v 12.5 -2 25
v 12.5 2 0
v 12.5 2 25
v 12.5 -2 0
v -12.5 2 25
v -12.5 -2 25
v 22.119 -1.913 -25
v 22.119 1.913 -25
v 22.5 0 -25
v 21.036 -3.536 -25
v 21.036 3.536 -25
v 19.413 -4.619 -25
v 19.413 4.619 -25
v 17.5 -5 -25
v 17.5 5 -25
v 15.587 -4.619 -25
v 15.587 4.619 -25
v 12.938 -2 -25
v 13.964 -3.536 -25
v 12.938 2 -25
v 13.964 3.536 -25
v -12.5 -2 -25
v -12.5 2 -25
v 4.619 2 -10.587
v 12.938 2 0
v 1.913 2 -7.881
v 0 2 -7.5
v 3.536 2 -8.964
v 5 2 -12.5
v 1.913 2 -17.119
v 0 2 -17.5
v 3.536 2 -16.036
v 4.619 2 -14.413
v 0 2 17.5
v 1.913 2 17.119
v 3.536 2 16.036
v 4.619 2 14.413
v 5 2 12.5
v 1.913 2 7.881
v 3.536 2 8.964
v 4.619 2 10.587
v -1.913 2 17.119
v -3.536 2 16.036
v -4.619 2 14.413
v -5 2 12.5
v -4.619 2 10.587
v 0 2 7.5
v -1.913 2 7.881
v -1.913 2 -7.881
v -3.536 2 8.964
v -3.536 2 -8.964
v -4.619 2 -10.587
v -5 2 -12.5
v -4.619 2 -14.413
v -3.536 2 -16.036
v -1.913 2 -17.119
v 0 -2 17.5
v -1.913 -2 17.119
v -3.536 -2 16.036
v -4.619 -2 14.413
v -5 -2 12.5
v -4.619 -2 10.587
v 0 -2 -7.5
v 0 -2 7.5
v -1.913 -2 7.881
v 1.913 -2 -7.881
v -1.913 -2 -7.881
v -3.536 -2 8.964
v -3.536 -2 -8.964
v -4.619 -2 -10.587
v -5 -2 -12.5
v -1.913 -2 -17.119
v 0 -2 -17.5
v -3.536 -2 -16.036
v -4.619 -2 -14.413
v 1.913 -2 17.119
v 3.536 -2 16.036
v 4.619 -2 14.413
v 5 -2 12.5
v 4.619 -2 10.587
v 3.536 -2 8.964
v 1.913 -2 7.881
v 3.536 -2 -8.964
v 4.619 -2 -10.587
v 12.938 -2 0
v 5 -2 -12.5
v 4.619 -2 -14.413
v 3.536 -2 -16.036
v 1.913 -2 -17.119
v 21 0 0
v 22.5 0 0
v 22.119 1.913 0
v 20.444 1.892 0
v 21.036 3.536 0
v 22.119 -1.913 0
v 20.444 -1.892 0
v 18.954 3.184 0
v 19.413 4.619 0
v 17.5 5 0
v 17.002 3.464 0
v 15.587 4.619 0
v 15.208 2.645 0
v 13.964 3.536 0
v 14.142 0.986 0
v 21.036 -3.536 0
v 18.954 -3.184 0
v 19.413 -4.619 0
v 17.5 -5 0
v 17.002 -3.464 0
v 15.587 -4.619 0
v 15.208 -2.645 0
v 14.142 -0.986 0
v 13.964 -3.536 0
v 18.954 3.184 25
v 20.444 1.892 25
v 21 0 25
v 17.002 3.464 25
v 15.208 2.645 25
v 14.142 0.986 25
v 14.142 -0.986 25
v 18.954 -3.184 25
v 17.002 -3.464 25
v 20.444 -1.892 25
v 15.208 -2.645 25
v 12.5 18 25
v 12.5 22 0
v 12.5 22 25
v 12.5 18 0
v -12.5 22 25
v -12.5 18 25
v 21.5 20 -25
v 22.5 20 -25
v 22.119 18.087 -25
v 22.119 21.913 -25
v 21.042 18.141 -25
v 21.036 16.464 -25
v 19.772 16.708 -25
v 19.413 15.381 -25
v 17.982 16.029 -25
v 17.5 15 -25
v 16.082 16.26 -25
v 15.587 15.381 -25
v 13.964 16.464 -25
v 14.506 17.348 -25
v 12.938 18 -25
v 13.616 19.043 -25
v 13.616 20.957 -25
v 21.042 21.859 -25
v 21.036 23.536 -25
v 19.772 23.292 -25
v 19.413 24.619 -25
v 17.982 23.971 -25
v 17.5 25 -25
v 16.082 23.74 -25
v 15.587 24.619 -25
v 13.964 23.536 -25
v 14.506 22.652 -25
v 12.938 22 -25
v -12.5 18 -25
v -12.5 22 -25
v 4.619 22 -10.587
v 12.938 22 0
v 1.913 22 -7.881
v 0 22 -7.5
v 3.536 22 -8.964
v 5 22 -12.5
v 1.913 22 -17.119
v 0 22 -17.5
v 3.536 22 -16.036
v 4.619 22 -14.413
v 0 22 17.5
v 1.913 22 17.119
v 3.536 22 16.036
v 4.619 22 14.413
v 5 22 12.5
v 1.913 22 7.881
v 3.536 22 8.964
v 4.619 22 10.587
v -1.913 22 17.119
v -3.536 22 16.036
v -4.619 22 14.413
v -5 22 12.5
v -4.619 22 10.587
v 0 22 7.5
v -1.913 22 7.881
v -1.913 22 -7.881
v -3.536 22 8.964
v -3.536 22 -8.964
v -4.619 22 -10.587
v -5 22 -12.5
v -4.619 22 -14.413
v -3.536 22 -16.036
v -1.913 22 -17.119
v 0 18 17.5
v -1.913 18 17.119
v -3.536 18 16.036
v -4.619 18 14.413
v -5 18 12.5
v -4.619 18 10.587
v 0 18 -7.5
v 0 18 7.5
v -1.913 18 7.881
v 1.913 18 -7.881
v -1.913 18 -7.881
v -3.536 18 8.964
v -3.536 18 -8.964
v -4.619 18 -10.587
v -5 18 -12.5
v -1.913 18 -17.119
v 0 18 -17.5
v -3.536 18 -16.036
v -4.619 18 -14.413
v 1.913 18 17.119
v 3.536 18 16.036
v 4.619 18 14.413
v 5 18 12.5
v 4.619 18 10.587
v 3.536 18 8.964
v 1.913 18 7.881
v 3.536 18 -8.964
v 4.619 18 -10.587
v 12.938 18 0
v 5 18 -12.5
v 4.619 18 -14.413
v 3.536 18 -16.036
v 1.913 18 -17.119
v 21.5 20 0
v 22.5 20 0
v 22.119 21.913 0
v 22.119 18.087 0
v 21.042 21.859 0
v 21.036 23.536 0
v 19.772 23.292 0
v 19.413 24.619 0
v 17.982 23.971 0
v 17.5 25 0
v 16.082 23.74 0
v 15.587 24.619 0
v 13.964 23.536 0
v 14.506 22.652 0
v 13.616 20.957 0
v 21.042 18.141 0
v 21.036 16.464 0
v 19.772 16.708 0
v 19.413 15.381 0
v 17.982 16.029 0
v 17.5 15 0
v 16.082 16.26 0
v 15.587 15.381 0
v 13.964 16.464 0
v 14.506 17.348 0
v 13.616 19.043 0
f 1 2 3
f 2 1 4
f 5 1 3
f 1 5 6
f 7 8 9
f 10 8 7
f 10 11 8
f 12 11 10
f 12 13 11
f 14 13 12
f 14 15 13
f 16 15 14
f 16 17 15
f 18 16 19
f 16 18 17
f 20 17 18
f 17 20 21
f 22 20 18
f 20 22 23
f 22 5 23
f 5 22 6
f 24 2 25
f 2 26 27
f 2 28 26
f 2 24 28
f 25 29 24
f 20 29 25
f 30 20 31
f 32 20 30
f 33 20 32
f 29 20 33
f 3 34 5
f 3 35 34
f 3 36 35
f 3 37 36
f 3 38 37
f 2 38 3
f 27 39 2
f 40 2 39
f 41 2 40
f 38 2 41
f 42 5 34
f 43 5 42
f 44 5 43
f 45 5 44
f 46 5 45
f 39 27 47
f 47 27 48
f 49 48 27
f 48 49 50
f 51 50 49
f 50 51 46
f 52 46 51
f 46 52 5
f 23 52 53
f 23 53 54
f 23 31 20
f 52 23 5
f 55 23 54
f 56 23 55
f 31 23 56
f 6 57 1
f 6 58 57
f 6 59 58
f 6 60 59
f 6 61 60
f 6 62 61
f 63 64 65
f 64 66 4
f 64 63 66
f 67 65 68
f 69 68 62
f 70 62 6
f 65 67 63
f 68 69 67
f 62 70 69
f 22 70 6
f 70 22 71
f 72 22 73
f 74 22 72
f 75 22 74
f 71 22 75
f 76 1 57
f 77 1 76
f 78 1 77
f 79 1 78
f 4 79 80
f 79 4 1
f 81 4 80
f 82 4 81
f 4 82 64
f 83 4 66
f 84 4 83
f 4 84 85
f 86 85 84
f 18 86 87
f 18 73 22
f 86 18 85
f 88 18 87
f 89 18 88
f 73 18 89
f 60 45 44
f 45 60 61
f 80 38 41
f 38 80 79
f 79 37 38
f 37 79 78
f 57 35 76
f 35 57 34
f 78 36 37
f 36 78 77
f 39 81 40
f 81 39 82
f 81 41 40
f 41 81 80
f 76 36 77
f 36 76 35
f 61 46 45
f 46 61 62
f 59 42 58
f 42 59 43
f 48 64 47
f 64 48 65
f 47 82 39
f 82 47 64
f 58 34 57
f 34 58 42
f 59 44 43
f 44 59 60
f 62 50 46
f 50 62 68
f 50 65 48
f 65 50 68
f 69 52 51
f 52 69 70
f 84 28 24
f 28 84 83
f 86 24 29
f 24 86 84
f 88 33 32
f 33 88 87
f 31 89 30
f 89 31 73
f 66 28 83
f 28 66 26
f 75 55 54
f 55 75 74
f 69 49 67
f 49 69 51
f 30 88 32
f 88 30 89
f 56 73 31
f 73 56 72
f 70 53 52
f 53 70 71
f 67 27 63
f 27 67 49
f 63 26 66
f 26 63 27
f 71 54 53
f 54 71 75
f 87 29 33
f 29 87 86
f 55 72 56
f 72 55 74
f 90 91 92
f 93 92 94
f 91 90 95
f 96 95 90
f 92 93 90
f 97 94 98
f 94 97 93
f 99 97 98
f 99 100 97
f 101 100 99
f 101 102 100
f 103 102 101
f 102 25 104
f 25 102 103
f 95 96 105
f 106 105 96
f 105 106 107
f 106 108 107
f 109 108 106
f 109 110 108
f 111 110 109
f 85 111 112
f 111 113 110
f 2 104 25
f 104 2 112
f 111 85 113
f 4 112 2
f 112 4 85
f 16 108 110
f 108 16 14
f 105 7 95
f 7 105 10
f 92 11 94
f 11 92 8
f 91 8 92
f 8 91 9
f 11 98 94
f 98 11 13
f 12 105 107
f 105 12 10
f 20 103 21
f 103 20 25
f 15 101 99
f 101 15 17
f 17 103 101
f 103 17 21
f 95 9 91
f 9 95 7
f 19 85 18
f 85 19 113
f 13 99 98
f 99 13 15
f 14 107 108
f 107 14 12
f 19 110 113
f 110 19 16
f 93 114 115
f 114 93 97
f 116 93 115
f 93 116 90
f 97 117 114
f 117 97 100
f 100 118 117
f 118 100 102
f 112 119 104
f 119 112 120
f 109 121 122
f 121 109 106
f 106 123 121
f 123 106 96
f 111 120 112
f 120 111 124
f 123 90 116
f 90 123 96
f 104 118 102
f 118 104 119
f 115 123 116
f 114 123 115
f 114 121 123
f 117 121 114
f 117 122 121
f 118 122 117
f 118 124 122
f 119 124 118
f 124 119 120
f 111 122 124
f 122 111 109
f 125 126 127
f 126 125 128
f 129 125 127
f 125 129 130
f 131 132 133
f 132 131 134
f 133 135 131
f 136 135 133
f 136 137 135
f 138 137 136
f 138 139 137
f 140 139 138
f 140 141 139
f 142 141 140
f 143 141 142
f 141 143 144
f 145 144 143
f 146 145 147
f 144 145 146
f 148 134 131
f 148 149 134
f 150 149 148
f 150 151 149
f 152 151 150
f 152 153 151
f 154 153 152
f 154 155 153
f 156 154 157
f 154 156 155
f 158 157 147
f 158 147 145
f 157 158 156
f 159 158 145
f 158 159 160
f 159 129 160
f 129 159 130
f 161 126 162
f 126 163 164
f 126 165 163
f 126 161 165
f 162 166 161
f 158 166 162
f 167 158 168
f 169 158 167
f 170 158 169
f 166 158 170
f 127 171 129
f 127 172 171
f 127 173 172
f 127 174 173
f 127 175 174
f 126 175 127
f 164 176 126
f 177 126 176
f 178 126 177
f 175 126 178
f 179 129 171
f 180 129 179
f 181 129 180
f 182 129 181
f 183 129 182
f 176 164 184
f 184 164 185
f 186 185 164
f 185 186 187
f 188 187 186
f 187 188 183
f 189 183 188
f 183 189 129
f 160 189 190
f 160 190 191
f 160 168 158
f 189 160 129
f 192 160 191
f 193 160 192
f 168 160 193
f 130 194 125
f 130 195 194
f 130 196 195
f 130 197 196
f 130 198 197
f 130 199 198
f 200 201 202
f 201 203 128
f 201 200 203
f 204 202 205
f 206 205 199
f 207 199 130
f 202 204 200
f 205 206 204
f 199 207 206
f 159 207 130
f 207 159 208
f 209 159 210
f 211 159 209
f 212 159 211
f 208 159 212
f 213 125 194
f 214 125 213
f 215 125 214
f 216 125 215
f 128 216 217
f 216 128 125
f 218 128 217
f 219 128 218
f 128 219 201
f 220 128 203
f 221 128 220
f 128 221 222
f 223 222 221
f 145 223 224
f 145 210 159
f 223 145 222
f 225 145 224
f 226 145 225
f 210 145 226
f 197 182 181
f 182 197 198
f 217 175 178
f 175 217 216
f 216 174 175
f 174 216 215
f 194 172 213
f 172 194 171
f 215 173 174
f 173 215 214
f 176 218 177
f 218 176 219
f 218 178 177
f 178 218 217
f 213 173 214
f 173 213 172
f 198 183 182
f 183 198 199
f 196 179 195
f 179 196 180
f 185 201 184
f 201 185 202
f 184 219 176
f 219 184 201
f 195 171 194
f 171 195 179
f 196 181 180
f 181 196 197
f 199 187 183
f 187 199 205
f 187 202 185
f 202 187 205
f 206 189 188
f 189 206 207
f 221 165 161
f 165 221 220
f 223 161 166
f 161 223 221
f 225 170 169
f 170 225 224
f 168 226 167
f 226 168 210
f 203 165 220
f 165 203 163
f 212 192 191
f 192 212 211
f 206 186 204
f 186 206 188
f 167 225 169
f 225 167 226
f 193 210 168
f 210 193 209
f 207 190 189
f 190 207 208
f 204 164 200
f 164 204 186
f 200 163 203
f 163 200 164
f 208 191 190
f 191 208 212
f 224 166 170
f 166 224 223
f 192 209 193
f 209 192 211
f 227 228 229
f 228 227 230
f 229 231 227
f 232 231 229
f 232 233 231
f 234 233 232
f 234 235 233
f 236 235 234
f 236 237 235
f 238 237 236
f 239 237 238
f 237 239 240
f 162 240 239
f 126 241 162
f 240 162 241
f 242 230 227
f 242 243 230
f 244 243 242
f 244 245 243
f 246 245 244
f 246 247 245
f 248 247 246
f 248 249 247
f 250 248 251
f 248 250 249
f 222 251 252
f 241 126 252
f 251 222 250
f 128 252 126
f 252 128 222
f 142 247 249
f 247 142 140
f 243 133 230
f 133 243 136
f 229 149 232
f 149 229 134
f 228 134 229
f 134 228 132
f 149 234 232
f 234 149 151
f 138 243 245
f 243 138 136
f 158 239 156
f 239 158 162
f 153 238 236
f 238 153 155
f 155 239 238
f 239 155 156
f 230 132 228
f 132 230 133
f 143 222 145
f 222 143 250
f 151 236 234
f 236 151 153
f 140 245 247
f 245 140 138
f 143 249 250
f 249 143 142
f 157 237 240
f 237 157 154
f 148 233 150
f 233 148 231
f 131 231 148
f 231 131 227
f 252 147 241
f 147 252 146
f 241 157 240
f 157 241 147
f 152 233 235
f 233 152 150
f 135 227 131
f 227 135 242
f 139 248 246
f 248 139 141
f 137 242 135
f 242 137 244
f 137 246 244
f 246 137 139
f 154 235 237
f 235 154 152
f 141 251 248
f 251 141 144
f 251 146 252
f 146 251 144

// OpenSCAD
module leaf (w, t, h, knuckle_dia, screw_dia){
 assert(screw_dia>=w/8);
 assert(screw_dia<w && screw_dia<h/2);
 assert(knuckle_dia>=t);
 union(){
  difference(){
   cube([w, t, h], center=true);
   translate([0, 0, h/4])
    rotate([90, 0, 0])
     cylinder(h=t, d=screw_dia, center = true);
   translate([0, 0, -h/4])
    rotate([90, 0, 0])
     cylinder(h=t, d=screw_dia, center = true);
  };
  translate([w/2 + knuckle_dia/4, 0, -h/4])
   cube([knuckle_dia/2, t, h/2], center = true);
  translate([w/2 + knuckle_dia/2, 0, -h/4])
   cylinder(h=h/2, d=knuckle_dia, center = true);
 }
}


module hinge (w, t, h, screw_dia, pin_dia, knuckle_dia){
 assert(pin_dia>=knuckle_dia*0.8);
 assert(pin_dia<knuckle_dia);
 union(){
  //Leaf with pin
  union(){
   leaf(w=w, t=t, h=h, knuckle_dia=knuckle_dia, screw_dia=screw_dia);
   translate([w/2+knuckle_dia/2, 0, h/4])
    cylinder(h=h/2, d=pin_dia-1, center = true);
  }
  //Leaf with hole
  difference(){
   translate([0, knuckle_dia*2, 0])
    leaf(w=w, t=t, h=h, knuckle_dia=knuckle_dia, screw_dia=screw_dia);
   translate([w/2+knuckle_dia/2, knuckle_dia*2, -h/4])
    cylinder(h=h/2, d=pin_dia, center = true);  
  }
 }
}

hinge(w=25, t=4, h=50, screw_dia=10, pin_dia=8, knuckle_dia=10);
